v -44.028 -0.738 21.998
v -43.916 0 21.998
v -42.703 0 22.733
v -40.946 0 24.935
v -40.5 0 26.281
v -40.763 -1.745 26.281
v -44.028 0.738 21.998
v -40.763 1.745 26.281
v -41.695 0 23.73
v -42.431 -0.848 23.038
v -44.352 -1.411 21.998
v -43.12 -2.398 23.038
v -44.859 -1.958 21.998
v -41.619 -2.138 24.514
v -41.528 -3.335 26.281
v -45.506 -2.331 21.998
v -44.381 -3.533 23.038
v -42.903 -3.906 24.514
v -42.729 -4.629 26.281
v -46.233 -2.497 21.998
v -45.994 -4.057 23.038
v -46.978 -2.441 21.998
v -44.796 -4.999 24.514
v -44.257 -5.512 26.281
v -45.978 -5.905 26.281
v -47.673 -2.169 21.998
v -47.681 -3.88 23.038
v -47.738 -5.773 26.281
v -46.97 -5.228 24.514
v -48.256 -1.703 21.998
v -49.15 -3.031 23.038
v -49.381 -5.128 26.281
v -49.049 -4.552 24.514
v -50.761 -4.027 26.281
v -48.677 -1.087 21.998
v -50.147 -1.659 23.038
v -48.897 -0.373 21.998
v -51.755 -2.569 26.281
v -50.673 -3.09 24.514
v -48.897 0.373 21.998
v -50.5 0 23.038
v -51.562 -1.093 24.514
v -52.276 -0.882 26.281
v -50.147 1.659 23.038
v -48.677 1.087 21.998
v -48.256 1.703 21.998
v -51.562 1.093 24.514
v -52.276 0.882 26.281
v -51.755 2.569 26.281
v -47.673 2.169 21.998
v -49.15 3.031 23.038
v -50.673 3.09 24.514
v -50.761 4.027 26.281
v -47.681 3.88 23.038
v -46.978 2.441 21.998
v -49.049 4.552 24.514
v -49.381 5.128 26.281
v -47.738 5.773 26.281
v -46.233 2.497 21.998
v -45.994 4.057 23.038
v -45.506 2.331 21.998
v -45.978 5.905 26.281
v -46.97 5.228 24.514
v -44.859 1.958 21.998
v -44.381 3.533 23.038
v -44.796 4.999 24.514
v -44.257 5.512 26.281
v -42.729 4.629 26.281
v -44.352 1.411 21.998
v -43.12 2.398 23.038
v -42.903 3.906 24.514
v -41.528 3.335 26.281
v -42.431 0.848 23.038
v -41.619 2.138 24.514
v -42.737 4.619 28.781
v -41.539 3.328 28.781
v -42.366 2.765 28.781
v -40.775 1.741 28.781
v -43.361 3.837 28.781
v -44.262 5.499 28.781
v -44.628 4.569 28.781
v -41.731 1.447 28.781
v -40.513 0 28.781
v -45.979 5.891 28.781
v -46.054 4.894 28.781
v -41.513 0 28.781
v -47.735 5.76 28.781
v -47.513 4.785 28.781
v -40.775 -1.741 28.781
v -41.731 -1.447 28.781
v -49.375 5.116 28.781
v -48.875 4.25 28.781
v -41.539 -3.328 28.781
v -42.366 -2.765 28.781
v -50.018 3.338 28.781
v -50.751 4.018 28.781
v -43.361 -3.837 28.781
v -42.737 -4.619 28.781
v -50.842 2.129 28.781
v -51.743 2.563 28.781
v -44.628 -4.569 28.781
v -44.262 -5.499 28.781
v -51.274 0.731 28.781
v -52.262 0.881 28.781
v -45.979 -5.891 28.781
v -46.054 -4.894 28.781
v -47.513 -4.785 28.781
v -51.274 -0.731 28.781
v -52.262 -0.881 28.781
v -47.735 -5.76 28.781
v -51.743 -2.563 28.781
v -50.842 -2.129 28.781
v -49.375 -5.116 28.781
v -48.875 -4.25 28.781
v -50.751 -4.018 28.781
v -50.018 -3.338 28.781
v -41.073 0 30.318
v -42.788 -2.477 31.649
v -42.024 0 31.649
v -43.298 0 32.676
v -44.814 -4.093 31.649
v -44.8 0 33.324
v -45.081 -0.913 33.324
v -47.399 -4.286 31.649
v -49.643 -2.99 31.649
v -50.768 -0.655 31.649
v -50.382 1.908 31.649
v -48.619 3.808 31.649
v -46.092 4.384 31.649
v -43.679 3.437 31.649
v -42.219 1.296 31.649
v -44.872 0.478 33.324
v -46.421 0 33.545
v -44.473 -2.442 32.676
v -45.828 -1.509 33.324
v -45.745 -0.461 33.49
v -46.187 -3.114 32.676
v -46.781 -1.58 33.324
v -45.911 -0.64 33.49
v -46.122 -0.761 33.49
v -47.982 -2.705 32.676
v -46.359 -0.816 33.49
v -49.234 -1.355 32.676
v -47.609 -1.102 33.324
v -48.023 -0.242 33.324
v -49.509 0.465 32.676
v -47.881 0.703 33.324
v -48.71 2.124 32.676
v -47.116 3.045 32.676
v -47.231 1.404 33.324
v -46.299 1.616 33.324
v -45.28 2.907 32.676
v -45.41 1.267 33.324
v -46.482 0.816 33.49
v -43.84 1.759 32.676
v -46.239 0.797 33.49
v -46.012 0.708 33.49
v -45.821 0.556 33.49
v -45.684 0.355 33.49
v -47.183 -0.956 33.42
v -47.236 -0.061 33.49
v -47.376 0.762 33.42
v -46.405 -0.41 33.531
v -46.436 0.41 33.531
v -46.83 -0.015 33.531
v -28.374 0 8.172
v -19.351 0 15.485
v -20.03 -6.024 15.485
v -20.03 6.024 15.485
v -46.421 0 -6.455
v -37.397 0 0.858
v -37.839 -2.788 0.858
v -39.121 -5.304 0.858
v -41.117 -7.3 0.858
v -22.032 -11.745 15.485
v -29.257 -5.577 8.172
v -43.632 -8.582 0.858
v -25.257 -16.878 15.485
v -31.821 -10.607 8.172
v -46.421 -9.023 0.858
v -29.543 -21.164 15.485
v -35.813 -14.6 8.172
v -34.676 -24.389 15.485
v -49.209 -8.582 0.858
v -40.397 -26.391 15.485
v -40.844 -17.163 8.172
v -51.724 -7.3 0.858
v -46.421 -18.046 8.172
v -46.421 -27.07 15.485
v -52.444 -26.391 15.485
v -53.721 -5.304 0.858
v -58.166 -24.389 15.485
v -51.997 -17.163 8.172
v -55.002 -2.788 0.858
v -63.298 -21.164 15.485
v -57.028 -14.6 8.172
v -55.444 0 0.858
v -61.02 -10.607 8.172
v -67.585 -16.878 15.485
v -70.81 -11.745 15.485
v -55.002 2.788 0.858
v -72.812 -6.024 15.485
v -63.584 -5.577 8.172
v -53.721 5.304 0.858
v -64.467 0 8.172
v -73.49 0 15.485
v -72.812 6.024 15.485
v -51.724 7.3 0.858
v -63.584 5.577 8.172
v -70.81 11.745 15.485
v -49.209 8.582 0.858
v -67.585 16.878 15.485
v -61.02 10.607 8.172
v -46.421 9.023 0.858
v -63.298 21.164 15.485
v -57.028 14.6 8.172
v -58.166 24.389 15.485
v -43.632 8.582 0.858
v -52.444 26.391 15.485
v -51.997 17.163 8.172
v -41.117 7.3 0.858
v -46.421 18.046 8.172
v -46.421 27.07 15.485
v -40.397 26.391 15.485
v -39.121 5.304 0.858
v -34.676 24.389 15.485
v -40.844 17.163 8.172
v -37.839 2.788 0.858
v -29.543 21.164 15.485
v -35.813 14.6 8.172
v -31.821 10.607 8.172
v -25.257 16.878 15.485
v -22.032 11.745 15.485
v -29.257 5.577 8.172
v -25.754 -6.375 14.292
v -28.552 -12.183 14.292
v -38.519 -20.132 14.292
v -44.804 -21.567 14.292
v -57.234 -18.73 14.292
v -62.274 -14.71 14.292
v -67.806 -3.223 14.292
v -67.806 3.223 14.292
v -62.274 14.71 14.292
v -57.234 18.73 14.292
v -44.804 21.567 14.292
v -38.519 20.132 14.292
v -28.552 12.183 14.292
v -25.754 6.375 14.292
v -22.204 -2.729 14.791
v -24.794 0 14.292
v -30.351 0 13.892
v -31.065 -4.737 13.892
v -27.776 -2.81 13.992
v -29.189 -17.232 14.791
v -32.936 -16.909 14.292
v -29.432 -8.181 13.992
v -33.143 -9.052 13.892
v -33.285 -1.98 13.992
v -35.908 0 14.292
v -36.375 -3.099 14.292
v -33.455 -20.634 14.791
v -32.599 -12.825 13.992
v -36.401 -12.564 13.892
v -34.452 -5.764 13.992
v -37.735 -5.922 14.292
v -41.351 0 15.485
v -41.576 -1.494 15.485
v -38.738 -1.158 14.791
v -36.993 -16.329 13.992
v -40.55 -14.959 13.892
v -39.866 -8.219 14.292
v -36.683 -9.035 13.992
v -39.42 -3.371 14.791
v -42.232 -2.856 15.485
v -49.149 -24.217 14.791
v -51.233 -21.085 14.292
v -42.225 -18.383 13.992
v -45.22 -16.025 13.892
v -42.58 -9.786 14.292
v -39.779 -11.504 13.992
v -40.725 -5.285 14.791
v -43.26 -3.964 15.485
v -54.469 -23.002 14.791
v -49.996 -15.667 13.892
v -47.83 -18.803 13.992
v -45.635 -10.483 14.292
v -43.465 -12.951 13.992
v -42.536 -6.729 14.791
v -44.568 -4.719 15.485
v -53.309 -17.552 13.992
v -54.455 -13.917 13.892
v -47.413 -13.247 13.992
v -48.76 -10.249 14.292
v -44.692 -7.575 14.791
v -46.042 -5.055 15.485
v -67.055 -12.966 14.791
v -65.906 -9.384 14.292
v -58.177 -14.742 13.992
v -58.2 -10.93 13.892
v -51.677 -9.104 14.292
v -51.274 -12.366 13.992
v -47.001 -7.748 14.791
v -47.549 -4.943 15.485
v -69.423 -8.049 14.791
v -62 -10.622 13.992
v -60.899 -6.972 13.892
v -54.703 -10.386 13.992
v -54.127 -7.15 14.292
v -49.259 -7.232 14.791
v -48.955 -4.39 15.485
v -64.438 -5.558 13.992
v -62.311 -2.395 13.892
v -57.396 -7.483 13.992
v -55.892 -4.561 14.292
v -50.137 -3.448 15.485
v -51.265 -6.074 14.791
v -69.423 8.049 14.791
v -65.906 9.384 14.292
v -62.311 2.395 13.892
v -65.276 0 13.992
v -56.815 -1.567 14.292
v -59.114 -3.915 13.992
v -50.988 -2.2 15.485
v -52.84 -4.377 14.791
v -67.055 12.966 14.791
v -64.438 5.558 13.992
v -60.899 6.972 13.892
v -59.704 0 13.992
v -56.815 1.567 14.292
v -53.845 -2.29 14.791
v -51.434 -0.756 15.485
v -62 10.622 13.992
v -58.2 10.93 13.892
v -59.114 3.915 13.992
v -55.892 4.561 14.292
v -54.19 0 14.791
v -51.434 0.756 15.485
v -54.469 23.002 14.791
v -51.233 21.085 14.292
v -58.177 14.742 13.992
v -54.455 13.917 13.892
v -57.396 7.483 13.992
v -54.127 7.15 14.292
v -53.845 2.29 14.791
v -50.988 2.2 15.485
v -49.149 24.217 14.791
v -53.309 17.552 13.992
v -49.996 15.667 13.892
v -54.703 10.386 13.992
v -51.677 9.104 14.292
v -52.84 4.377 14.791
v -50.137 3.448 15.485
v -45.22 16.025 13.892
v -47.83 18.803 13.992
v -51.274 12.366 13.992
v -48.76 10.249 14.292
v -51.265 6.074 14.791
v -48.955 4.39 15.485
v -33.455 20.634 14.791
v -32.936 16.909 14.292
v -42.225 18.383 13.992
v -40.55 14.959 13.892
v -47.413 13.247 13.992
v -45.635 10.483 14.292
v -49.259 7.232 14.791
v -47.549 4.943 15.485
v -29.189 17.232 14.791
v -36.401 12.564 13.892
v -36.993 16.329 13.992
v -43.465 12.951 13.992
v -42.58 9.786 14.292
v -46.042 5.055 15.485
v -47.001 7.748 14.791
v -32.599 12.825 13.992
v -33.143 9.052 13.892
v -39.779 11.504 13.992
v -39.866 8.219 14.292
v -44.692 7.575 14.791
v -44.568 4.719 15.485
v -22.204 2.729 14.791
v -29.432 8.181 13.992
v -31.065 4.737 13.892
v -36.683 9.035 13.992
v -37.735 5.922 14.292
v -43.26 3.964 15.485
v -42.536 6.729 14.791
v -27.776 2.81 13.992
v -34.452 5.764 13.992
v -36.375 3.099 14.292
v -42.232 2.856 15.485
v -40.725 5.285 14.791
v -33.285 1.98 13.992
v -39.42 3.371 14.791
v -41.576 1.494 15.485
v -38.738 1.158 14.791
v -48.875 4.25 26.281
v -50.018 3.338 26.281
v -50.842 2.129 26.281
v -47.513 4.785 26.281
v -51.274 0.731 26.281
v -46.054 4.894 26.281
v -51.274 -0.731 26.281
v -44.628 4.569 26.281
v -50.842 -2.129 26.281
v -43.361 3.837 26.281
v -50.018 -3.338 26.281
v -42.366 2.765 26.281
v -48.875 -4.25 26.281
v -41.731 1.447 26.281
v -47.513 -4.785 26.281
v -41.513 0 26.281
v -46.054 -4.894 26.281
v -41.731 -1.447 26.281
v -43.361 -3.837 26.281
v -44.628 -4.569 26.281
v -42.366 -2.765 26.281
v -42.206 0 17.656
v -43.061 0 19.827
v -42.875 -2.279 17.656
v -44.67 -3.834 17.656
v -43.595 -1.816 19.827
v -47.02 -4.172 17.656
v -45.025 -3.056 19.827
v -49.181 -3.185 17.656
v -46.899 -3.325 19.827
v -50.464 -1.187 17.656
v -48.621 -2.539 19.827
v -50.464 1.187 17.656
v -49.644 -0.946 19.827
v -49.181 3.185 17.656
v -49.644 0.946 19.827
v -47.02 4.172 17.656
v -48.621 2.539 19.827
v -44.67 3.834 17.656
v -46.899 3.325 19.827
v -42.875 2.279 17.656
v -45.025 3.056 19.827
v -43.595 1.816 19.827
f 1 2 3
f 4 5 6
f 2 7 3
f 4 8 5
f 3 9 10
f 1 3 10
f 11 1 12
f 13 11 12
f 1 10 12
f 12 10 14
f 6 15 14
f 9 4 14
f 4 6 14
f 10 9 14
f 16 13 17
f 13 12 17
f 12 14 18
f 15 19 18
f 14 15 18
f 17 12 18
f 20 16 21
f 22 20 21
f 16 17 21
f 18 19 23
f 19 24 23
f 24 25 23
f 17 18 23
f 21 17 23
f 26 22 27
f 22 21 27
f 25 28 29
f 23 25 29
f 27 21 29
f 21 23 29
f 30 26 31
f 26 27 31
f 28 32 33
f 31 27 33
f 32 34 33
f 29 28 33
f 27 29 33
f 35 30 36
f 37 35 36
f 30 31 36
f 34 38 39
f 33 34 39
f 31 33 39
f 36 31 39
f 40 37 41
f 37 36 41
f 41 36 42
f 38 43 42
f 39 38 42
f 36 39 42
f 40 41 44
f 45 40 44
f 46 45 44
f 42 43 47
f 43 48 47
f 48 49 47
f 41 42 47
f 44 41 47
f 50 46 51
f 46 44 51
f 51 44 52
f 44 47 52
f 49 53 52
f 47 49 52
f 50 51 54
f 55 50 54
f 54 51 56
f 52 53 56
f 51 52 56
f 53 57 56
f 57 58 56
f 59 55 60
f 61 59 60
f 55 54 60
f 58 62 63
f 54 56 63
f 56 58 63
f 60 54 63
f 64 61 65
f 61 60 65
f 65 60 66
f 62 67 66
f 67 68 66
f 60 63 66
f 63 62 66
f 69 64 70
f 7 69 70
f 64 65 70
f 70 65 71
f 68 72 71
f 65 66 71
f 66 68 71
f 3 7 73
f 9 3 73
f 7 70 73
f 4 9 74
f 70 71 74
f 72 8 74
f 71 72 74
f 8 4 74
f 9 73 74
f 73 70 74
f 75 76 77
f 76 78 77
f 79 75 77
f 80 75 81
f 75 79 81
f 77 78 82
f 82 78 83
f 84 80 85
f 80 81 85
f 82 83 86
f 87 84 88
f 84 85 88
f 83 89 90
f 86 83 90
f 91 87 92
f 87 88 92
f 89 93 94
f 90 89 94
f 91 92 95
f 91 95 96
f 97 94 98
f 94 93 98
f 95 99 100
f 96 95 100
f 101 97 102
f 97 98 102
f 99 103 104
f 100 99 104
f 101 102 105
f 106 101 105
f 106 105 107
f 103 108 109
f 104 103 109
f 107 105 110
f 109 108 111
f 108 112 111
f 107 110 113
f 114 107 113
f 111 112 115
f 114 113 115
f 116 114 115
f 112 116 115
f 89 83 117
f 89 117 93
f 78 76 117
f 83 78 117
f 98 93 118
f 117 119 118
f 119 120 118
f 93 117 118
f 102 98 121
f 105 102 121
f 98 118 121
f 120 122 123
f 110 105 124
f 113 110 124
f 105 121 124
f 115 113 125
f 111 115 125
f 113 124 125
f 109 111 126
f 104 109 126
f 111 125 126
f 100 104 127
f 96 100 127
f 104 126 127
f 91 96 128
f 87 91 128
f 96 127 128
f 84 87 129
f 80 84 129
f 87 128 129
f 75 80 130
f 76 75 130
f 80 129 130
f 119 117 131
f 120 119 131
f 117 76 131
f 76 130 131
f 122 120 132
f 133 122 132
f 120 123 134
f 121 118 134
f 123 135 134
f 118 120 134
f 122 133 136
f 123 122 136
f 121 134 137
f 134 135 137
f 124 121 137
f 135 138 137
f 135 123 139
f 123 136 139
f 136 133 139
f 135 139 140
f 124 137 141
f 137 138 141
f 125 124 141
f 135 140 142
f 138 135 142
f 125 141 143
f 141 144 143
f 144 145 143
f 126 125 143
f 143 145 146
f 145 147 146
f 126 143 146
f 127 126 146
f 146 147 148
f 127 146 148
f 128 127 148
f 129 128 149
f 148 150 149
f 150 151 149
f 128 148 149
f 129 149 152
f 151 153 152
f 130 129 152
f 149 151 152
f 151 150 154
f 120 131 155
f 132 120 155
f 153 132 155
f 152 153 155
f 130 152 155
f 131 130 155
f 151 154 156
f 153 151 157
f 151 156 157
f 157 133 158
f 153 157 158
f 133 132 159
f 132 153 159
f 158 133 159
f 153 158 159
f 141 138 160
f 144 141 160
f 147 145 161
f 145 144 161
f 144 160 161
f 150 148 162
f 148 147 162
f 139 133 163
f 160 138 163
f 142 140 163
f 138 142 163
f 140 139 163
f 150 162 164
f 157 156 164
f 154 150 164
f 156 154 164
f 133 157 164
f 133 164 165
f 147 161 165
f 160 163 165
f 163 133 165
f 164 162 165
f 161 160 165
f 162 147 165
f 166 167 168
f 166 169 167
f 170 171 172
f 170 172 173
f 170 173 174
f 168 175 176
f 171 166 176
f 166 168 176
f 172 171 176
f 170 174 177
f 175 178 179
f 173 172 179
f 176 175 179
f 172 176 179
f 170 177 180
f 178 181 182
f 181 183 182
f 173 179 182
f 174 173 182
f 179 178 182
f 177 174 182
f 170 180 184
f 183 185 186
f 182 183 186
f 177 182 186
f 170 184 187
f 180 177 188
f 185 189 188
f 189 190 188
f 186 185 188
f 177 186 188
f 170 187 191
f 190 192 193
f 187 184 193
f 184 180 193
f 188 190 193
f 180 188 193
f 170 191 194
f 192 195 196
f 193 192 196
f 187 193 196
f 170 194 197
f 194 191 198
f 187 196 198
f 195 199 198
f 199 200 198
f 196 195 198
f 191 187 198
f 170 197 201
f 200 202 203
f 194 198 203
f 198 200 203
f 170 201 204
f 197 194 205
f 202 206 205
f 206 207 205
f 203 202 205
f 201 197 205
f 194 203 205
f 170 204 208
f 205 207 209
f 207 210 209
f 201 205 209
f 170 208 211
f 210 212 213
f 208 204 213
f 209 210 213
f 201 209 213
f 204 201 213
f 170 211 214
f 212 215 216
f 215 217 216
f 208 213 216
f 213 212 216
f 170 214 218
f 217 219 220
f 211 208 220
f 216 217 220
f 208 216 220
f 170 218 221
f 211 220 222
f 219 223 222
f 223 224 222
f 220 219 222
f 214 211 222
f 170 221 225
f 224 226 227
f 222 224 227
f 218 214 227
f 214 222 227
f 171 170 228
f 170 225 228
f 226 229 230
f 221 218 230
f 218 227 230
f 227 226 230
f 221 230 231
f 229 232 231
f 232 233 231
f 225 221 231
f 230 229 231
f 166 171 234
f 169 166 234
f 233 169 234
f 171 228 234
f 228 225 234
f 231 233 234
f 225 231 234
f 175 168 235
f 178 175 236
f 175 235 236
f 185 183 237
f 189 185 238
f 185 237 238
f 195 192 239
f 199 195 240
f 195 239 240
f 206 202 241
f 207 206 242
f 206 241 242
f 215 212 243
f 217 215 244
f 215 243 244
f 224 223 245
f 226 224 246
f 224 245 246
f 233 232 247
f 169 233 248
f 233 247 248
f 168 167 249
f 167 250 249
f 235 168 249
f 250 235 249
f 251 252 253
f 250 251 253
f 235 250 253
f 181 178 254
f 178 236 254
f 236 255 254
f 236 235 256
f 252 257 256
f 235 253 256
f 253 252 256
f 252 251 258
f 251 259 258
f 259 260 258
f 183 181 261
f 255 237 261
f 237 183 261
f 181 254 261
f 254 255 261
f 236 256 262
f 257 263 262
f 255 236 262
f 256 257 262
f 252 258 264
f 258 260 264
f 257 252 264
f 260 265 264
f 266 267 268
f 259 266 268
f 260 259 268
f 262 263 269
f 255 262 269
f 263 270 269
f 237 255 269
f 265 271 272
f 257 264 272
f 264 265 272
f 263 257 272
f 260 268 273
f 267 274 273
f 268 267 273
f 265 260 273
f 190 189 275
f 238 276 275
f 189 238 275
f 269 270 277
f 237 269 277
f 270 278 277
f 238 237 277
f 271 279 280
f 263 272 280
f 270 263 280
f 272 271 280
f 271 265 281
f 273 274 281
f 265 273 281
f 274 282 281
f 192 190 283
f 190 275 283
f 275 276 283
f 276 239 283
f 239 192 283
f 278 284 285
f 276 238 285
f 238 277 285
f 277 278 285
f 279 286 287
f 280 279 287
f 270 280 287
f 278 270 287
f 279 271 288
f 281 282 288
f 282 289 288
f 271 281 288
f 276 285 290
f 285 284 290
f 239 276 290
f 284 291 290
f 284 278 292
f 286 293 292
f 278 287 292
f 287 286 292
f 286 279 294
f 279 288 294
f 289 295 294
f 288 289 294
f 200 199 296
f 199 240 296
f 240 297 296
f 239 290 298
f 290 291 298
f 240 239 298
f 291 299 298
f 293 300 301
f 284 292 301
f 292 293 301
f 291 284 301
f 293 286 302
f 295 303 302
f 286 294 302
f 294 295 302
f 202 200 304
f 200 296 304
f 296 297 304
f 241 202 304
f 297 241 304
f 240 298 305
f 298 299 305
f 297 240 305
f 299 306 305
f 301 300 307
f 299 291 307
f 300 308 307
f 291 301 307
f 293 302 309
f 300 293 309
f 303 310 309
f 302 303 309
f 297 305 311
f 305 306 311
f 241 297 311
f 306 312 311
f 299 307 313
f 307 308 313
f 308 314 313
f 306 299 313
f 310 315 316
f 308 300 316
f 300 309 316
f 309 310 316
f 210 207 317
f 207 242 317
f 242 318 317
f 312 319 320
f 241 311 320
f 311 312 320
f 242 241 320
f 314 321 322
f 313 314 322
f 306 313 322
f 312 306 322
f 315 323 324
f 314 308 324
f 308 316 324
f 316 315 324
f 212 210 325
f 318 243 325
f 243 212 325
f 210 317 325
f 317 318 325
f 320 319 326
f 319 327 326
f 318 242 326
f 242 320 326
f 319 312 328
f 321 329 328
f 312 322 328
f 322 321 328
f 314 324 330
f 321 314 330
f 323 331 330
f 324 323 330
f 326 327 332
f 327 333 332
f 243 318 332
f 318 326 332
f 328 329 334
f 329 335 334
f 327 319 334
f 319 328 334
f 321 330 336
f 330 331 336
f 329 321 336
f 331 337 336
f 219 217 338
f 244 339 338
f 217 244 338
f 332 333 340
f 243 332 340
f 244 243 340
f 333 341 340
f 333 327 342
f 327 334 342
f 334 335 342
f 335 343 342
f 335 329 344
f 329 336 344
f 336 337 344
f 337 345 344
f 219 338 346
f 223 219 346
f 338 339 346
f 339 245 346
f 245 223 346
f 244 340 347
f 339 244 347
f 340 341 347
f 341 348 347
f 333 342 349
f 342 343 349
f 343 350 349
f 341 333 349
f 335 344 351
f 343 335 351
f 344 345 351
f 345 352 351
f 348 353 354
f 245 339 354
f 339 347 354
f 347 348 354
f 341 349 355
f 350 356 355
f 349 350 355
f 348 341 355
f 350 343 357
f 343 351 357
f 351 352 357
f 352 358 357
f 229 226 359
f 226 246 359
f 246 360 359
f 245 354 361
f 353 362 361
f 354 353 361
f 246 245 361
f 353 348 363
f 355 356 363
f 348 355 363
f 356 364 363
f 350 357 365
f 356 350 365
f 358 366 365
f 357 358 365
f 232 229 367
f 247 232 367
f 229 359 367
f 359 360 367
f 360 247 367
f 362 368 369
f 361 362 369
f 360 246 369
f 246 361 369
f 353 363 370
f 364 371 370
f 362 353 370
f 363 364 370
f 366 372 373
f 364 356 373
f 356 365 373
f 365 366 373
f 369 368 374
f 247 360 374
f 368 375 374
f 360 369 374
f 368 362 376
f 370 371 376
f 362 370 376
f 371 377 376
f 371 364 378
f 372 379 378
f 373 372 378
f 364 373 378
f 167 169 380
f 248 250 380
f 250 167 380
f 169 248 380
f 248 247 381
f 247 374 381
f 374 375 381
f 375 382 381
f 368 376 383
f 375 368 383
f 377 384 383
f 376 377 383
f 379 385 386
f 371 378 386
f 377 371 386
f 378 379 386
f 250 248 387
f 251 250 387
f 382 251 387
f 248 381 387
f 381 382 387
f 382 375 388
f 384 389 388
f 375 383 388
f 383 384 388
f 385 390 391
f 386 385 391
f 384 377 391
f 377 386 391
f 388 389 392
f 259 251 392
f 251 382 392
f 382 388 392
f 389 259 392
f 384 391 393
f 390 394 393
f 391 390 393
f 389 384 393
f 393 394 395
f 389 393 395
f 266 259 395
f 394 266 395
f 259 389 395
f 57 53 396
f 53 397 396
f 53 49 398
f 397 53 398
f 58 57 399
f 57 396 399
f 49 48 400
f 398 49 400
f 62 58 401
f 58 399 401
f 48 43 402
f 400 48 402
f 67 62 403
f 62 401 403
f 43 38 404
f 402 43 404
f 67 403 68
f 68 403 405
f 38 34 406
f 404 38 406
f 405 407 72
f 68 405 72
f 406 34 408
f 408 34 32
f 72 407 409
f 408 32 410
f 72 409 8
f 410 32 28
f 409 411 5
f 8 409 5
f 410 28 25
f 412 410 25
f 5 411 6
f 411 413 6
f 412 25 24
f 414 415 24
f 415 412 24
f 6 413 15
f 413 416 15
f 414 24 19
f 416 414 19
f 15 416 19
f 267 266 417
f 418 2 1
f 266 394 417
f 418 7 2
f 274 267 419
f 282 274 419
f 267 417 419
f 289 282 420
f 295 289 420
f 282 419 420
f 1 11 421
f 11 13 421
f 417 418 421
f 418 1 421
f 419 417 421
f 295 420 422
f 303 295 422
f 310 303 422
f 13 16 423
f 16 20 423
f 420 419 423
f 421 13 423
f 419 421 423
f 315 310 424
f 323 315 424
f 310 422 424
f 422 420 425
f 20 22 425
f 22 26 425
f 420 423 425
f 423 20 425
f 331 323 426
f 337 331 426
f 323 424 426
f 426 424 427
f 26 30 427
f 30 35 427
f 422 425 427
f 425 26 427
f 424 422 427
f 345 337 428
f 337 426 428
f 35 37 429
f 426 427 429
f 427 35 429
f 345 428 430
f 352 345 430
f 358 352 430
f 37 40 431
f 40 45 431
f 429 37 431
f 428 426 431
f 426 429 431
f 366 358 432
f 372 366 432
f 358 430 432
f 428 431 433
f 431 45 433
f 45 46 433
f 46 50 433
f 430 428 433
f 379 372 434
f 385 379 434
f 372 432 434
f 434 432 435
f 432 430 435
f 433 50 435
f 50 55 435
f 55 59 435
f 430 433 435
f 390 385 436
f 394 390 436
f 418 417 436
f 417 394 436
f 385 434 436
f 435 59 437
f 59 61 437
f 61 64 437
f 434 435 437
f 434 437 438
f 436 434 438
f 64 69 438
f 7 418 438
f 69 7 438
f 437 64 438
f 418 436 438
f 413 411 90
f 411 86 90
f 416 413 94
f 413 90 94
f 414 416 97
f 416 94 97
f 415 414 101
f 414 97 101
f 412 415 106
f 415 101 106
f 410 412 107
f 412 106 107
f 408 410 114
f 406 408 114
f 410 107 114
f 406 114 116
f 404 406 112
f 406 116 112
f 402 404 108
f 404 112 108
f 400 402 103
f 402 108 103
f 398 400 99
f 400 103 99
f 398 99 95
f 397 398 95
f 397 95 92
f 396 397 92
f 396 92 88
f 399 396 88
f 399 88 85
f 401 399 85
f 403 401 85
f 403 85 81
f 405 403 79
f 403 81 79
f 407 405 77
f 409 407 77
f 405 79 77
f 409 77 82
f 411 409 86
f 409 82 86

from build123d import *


with BuildPart() as f1:
    # F0 (on Front) → F1 (revolve)
    with BuildSketch(Plane.XZ):
        with BuildLine():
            Line((-41.350949, 15.48482), (-43.916382, 21.997772))
            ThreePointArc((-43.916382, 21.997772), (-41.694805, 23.730102), (-40.499528, 26.281119))
            Line((-40.499528, 26.281119), (-40.512723, 26.281119))
            Line((-40.512723, 26.281119), (-41.512723, 26.281119))
            Line((-41.512723, 26.281119), (-41.512723, 28.781119))
            Line((-41.512723, 28.781119), (-40.512723, 28.781119))
            ThreePointArc((-40.512723, 28.781119), (-42.625913, 32.205739), (-46.420603, 33.545113))
            Line((-46.420603, 33.545113), (-46.420603, -6.454887))
            Line((-46.420603, -6.454887), (-19.350949, 15.48482))
            ThreePointArc((-19.350949, 15.48482), (-30.350949, 13.892111), (-41.350949, 15.48482))
        make_face()
    revolve(axis=Axis((-46.420603, 0, 13.545113), (0, 0, -1)))


solid = f1.part
